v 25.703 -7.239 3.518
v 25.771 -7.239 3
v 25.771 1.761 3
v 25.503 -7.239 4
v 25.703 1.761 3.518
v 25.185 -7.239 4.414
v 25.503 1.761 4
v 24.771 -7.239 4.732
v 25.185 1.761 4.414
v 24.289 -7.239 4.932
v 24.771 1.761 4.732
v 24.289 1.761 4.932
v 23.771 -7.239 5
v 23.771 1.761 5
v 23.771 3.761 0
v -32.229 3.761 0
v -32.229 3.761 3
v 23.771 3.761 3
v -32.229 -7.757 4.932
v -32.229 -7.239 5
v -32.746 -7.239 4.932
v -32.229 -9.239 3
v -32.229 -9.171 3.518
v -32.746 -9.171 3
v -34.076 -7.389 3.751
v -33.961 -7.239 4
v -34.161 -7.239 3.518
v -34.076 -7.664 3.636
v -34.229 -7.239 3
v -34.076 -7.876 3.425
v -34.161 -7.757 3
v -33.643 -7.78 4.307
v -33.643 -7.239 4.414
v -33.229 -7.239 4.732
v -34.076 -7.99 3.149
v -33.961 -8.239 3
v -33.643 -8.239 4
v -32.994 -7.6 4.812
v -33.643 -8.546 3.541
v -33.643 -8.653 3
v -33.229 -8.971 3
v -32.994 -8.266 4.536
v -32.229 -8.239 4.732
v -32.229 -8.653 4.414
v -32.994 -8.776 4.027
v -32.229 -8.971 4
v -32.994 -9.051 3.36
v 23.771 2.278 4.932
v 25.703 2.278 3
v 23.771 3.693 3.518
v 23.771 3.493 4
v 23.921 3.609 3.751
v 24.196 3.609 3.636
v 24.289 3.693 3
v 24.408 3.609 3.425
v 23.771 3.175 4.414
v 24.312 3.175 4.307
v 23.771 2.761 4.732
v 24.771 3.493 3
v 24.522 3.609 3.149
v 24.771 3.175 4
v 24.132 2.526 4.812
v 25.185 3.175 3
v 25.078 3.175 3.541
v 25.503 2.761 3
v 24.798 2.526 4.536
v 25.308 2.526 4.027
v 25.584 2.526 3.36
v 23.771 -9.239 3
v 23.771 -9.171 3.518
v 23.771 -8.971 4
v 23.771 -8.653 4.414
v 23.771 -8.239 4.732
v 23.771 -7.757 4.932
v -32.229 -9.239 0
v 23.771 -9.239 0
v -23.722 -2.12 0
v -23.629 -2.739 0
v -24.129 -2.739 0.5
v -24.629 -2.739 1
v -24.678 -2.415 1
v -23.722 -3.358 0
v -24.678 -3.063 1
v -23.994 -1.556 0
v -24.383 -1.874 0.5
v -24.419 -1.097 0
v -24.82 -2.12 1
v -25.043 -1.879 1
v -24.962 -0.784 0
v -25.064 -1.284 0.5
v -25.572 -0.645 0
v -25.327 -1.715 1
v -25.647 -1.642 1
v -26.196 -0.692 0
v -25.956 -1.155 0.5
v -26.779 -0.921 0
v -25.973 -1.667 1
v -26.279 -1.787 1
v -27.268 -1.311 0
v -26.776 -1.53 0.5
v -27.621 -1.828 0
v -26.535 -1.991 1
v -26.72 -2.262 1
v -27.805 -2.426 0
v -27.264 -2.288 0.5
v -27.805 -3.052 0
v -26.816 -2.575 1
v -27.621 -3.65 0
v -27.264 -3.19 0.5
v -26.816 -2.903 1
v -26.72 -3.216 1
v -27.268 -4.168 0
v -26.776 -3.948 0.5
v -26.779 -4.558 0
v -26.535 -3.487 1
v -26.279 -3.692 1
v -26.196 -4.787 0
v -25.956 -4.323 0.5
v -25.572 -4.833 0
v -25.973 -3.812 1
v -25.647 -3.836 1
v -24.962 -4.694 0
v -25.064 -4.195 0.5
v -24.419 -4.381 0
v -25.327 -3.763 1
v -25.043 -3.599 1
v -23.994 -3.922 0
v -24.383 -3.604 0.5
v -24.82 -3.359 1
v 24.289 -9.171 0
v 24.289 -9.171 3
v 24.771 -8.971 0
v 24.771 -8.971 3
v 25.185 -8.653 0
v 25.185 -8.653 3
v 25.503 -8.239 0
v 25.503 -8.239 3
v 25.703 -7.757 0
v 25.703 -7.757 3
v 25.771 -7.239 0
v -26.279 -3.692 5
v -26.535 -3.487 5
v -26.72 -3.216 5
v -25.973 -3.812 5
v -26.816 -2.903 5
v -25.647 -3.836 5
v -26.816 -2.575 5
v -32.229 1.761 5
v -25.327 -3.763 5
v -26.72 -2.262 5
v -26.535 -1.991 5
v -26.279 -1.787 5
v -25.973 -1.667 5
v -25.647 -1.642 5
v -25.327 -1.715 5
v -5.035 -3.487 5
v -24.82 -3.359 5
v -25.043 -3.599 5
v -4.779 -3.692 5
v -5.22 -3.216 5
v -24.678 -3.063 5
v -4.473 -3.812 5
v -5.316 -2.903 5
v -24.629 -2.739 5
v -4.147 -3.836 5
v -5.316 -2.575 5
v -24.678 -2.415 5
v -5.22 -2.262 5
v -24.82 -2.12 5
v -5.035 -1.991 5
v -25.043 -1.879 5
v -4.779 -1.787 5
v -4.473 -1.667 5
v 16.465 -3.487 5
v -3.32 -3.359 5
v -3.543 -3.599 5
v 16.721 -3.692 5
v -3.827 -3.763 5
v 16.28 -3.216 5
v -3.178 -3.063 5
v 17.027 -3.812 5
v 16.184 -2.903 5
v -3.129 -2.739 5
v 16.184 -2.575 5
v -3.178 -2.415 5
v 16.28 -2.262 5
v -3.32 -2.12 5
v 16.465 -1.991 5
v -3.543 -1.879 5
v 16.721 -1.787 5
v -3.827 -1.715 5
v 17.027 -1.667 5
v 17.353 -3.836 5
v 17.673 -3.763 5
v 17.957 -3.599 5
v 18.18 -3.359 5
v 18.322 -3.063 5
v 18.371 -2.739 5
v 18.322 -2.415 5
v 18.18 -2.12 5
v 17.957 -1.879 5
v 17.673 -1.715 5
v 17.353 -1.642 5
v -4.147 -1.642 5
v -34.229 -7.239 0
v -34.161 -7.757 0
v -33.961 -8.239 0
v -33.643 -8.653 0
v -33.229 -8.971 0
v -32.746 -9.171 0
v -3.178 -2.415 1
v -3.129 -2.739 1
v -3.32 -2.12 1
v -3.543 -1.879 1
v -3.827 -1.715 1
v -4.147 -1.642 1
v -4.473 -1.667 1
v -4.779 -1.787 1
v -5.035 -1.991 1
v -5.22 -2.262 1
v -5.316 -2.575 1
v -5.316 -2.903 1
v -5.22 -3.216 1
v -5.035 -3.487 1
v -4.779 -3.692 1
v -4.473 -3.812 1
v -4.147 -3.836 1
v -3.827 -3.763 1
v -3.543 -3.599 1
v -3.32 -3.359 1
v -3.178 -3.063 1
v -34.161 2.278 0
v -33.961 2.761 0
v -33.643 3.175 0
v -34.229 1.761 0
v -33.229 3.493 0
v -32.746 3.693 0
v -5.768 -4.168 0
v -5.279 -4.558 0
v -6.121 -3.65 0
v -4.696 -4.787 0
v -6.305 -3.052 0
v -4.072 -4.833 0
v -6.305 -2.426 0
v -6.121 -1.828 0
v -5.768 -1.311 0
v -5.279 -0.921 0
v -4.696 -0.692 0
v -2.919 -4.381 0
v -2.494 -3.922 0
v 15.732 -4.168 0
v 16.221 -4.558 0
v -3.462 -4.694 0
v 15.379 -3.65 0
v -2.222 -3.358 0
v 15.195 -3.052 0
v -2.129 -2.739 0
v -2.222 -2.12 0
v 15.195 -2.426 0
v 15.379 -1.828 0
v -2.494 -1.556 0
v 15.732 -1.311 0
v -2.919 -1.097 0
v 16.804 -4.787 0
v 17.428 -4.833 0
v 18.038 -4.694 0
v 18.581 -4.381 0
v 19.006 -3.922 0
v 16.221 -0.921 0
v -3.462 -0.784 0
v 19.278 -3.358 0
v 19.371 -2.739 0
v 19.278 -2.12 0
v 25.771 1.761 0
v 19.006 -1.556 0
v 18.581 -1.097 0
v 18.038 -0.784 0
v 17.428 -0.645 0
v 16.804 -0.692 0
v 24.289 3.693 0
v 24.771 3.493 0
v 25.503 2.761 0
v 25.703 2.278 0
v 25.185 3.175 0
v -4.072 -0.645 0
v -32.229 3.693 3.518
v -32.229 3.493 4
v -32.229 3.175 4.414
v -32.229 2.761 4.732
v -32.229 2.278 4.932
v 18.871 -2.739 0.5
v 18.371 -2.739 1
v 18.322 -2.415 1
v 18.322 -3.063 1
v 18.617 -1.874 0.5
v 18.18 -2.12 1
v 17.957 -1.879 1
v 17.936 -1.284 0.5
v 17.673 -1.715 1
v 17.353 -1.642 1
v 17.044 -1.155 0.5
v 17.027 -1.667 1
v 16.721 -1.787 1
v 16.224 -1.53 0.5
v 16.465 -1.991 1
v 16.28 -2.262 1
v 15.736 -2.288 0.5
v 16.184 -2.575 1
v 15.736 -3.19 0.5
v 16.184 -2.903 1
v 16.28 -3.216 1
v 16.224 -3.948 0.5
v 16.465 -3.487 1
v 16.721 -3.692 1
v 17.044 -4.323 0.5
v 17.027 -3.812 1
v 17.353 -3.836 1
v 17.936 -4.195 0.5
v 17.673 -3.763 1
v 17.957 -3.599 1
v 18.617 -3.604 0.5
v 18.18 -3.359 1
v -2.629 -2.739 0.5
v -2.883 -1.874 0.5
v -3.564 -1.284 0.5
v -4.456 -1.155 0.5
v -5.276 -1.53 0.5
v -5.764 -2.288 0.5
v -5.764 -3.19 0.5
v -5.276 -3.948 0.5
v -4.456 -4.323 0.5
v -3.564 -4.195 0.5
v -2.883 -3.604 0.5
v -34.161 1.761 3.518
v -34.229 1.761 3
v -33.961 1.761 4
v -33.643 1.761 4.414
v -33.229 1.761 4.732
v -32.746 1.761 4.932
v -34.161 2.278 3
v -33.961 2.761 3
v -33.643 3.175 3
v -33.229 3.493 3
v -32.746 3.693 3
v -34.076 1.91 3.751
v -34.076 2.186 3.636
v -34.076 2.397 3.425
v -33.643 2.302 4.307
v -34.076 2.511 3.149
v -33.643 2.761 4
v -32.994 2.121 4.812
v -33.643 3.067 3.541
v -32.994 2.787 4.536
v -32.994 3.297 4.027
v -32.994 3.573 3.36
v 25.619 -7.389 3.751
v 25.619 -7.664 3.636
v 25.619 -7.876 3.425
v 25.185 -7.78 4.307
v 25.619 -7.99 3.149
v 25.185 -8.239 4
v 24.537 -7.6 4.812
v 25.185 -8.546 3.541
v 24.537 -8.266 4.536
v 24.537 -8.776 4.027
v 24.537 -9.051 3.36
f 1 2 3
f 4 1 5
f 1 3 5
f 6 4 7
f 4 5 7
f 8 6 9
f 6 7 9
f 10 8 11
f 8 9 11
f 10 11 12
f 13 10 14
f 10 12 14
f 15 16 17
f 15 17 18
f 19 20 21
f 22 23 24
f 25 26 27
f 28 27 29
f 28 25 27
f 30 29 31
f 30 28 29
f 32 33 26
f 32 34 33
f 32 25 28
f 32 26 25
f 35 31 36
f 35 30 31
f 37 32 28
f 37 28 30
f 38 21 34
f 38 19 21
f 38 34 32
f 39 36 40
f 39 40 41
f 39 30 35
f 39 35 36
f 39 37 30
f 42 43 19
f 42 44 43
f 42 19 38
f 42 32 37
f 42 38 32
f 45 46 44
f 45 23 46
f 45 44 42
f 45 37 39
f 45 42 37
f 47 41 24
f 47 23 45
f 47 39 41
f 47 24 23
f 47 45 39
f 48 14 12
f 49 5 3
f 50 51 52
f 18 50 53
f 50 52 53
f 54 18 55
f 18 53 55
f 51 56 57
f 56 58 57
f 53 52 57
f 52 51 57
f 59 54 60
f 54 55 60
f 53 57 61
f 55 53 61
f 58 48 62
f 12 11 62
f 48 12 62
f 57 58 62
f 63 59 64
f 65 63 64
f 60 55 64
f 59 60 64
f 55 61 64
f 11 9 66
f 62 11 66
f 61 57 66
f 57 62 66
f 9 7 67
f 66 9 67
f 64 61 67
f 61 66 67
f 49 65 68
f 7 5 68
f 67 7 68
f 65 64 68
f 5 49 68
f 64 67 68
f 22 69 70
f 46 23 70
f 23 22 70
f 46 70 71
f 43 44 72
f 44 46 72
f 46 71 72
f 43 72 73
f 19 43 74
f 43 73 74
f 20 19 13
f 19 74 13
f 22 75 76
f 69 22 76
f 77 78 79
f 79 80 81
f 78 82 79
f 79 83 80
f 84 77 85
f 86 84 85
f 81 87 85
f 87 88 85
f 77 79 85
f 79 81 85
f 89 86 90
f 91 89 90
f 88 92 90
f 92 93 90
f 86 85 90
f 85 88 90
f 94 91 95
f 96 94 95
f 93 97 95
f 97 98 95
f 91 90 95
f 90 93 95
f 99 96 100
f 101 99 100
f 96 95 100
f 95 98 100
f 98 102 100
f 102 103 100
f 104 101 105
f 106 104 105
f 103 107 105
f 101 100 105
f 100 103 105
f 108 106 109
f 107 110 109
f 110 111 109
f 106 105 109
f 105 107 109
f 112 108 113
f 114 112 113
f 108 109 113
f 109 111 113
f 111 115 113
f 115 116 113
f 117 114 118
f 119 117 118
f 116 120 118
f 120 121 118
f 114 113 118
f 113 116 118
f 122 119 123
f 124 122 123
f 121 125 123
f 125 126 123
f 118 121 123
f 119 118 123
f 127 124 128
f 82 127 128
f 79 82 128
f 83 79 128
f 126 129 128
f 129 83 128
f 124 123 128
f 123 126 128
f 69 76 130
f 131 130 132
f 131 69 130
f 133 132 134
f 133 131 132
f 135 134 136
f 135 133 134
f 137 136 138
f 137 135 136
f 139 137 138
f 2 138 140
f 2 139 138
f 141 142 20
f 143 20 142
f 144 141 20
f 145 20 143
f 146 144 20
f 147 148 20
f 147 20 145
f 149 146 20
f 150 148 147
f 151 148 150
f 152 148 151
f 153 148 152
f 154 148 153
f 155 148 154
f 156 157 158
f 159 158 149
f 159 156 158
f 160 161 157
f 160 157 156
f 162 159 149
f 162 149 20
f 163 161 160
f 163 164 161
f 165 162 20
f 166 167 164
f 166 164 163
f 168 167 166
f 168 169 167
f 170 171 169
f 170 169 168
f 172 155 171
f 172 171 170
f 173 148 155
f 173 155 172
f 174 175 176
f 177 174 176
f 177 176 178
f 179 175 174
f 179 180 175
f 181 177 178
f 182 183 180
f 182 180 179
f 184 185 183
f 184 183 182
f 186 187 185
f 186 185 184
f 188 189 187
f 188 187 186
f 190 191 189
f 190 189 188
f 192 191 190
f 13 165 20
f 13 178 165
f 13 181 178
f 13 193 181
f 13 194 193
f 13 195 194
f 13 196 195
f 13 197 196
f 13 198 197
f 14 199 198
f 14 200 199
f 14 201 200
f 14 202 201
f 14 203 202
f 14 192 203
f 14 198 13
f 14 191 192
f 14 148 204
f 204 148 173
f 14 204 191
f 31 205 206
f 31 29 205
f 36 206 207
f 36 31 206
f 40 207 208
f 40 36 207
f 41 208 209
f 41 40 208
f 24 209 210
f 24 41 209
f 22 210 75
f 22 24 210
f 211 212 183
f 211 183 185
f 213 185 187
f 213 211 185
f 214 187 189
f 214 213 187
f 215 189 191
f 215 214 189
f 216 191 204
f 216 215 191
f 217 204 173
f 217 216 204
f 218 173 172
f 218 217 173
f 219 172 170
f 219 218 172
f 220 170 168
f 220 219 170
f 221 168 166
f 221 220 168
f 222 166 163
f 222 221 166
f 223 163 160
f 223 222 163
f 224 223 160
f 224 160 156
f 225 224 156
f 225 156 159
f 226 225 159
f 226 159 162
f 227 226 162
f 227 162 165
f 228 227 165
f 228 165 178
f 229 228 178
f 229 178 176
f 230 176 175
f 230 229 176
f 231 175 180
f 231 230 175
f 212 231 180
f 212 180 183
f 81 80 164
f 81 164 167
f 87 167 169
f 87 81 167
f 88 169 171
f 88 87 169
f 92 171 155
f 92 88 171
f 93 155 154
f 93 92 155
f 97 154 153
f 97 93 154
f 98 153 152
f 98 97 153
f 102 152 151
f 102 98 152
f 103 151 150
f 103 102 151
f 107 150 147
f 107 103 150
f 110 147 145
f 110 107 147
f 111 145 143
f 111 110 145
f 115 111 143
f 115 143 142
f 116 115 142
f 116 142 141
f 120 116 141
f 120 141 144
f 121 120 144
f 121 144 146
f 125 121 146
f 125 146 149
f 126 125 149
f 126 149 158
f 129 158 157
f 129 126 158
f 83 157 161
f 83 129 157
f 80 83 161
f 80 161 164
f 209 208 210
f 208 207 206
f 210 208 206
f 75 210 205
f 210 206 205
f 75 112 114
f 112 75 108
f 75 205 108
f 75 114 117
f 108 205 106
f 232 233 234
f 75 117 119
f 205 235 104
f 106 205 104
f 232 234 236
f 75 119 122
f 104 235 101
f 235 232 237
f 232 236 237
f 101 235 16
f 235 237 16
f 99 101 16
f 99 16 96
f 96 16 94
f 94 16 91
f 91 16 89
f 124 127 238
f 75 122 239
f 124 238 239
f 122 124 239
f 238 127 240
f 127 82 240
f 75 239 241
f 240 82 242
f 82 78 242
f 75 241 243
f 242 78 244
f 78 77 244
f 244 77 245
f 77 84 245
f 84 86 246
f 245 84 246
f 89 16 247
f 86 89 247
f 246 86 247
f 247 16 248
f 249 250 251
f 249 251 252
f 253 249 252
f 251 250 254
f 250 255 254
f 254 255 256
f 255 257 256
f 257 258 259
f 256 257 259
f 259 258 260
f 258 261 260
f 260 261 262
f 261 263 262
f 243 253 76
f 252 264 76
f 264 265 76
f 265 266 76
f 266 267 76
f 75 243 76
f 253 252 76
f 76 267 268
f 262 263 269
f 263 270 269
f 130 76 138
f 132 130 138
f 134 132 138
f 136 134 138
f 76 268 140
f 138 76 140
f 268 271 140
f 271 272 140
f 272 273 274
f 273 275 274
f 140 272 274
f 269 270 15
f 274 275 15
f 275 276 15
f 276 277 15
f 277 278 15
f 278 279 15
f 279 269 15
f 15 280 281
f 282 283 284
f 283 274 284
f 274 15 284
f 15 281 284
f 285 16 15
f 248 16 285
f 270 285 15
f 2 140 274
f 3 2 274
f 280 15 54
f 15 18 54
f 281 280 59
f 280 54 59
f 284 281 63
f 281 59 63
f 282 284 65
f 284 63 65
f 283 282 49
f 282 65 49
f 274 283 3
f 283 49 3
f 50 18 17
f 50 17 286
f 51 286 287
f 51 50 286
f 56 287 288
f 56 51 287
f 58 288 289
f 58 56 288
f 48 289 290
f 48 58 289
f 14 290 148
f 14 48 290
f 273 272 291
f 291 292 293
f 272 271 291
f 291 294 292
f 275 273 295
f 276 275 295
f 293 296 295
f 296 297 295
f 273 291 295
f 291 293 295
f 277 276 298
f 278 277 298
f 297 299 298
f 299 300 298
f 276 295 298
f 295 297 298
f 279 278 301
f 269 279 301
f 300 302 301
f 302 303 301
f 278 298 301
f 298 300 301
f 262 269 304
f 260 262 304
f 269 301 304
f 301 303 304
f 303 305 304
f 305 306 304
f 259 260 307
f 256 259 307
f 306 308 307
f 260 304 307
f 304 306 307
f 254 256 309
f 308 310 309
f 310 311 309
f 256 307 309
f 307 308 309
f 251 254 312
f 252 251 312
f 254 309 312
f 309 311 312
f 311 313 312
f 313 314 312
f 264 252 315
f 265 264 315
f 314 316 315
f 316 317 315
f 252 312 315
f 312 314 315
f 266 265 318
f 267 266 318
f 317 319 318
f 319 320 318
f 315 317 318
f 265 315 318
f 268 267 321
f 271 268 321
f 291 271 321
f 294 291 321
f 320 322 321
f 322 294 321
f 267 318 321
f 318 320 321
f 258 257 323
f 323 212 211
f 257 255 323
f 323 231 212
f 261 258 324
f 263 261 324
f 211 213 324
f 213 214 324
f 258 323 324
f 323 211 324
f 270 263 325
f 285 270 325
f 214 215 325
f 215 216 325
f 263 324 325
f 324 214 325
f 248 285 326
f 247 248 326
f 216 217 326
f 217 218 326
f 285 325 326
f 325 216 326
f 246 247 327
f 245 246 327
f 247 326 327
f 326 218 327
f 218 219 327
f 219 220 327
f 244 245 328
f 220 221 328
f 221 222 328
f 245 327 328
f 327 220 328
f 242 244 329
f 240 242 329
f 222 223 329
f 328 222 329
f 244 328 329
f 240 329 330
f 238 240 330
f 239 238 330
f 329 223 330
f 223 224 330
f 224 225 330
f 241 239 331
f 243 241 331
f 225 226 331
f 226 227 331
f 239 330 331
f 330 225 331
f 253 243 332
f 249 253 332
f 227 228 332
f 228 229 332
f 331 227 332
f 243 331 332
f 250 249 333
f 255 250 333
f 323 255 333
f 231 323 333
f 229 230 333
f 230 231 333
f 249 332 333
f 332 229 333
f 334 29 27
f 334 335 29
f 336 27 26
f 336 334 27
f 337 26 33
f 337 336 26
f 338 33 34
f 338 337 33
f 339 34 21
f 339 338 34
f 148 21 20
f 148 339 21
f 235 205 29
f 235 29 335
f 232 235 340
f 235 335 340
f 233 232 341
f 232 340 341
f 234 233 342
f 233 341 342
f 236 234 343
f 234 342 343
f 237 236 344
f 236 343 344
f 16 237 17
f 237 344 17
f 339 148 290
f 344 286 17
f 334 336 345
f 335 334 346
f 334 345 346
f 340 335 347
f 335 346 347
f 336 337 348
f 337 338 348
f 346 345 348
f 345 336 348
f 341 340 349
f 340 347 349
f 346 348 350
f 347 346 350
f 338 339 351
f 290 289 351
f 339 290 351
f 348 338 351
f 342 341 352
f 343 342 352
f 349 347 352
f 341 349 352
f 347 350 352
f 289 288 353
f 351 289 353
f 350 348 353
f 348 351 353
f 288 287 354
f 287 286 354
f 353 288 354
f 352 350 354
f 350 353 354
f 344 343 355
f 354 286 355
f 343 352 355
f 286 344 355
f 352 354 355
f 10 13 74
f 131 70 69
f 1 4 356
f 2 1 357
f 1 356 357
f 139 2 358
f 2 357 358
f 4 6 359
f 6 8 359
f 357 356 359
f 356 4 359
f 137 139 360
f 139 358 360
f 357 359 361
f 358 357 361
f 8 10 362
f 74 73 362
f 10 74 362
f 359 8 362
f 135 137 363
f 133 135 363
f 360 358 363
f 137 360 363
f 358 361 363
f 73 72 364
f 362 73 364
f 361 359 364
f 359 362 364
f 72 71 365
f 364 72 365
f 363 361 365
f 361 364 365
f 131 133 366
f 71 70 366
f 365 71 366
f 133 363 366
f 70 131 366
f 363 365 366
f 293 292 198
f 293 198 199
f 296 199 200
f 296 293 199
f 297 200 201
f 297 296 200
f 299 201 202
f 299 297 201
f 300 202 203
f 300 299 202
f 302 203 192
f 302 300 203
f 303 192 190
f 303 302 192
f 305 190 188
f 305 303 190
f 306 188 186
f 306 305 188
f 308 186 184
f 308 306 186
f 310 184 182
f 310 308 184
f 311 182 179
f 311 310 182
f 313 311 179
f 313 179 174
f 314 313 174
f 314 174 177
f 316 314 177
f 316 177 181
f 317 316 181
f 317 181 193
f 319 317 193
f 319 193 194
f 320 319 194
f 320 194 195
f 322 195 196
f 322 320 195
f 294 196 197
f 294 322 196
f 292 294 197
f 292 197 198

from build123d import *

# Parameters (mm, degrees)
F0_W     = 60
F0_H     = 13
F0_R     = 1.1
F1_DEPTH = 5
F2_R     = 2
F3_SIZE  = 1


with BuildPart() as f1:
    # F0 (on Top) → F1 (new body)
    with BuildSketch(Plane.XY):
        with Locations((-4.228717, -2.739199)):
            Rectangle(F0_W, F0_H)
        with Locations((-25.728717, -2.739199)):
            Circle(F0_R, mode=Mode.SUBTRACT)
        with Locations((-4.228717, -2.739199)):
            Circle(F0_R, mode=Mode.SUBTRACT)
        with Locations((17.271283, -2.739199)):
            Circle(F0_R, mode=Mode.SUBTRACT)
    extrude(amount=F1_DEPTH)

    # F2
    f2_edges = [f1.edges().sort_by_distance(p)[0] for p in [
        (-4.228717, -9.239199, 5),
        (25.771283, -2.739199, 5),
        (25.771283, -9.239199, 2.5),
        (-4.228717, 3.760801, 5),
        (-34.228717, -2.739199, 5),
        (-34.228717, -9.239199, 2.5),
        (25.771283, 3.760801, 2.5),
        (-34.228717, 3.760801, 2.5),
    ]]
    fillet(f2_edges, radius=F2_R)

    # F3
    f3_edges = [f1.edges().sort_by_distance(p)[0] for p in [
        (-5.328717, -2.739199, 0),
        (16.171283, -2.739199, 0),
        (-26.828717, -2.739199, 0),
    ]]
    chamfer(f3_edges, length=F3_SIZE)


solid = f1.part
